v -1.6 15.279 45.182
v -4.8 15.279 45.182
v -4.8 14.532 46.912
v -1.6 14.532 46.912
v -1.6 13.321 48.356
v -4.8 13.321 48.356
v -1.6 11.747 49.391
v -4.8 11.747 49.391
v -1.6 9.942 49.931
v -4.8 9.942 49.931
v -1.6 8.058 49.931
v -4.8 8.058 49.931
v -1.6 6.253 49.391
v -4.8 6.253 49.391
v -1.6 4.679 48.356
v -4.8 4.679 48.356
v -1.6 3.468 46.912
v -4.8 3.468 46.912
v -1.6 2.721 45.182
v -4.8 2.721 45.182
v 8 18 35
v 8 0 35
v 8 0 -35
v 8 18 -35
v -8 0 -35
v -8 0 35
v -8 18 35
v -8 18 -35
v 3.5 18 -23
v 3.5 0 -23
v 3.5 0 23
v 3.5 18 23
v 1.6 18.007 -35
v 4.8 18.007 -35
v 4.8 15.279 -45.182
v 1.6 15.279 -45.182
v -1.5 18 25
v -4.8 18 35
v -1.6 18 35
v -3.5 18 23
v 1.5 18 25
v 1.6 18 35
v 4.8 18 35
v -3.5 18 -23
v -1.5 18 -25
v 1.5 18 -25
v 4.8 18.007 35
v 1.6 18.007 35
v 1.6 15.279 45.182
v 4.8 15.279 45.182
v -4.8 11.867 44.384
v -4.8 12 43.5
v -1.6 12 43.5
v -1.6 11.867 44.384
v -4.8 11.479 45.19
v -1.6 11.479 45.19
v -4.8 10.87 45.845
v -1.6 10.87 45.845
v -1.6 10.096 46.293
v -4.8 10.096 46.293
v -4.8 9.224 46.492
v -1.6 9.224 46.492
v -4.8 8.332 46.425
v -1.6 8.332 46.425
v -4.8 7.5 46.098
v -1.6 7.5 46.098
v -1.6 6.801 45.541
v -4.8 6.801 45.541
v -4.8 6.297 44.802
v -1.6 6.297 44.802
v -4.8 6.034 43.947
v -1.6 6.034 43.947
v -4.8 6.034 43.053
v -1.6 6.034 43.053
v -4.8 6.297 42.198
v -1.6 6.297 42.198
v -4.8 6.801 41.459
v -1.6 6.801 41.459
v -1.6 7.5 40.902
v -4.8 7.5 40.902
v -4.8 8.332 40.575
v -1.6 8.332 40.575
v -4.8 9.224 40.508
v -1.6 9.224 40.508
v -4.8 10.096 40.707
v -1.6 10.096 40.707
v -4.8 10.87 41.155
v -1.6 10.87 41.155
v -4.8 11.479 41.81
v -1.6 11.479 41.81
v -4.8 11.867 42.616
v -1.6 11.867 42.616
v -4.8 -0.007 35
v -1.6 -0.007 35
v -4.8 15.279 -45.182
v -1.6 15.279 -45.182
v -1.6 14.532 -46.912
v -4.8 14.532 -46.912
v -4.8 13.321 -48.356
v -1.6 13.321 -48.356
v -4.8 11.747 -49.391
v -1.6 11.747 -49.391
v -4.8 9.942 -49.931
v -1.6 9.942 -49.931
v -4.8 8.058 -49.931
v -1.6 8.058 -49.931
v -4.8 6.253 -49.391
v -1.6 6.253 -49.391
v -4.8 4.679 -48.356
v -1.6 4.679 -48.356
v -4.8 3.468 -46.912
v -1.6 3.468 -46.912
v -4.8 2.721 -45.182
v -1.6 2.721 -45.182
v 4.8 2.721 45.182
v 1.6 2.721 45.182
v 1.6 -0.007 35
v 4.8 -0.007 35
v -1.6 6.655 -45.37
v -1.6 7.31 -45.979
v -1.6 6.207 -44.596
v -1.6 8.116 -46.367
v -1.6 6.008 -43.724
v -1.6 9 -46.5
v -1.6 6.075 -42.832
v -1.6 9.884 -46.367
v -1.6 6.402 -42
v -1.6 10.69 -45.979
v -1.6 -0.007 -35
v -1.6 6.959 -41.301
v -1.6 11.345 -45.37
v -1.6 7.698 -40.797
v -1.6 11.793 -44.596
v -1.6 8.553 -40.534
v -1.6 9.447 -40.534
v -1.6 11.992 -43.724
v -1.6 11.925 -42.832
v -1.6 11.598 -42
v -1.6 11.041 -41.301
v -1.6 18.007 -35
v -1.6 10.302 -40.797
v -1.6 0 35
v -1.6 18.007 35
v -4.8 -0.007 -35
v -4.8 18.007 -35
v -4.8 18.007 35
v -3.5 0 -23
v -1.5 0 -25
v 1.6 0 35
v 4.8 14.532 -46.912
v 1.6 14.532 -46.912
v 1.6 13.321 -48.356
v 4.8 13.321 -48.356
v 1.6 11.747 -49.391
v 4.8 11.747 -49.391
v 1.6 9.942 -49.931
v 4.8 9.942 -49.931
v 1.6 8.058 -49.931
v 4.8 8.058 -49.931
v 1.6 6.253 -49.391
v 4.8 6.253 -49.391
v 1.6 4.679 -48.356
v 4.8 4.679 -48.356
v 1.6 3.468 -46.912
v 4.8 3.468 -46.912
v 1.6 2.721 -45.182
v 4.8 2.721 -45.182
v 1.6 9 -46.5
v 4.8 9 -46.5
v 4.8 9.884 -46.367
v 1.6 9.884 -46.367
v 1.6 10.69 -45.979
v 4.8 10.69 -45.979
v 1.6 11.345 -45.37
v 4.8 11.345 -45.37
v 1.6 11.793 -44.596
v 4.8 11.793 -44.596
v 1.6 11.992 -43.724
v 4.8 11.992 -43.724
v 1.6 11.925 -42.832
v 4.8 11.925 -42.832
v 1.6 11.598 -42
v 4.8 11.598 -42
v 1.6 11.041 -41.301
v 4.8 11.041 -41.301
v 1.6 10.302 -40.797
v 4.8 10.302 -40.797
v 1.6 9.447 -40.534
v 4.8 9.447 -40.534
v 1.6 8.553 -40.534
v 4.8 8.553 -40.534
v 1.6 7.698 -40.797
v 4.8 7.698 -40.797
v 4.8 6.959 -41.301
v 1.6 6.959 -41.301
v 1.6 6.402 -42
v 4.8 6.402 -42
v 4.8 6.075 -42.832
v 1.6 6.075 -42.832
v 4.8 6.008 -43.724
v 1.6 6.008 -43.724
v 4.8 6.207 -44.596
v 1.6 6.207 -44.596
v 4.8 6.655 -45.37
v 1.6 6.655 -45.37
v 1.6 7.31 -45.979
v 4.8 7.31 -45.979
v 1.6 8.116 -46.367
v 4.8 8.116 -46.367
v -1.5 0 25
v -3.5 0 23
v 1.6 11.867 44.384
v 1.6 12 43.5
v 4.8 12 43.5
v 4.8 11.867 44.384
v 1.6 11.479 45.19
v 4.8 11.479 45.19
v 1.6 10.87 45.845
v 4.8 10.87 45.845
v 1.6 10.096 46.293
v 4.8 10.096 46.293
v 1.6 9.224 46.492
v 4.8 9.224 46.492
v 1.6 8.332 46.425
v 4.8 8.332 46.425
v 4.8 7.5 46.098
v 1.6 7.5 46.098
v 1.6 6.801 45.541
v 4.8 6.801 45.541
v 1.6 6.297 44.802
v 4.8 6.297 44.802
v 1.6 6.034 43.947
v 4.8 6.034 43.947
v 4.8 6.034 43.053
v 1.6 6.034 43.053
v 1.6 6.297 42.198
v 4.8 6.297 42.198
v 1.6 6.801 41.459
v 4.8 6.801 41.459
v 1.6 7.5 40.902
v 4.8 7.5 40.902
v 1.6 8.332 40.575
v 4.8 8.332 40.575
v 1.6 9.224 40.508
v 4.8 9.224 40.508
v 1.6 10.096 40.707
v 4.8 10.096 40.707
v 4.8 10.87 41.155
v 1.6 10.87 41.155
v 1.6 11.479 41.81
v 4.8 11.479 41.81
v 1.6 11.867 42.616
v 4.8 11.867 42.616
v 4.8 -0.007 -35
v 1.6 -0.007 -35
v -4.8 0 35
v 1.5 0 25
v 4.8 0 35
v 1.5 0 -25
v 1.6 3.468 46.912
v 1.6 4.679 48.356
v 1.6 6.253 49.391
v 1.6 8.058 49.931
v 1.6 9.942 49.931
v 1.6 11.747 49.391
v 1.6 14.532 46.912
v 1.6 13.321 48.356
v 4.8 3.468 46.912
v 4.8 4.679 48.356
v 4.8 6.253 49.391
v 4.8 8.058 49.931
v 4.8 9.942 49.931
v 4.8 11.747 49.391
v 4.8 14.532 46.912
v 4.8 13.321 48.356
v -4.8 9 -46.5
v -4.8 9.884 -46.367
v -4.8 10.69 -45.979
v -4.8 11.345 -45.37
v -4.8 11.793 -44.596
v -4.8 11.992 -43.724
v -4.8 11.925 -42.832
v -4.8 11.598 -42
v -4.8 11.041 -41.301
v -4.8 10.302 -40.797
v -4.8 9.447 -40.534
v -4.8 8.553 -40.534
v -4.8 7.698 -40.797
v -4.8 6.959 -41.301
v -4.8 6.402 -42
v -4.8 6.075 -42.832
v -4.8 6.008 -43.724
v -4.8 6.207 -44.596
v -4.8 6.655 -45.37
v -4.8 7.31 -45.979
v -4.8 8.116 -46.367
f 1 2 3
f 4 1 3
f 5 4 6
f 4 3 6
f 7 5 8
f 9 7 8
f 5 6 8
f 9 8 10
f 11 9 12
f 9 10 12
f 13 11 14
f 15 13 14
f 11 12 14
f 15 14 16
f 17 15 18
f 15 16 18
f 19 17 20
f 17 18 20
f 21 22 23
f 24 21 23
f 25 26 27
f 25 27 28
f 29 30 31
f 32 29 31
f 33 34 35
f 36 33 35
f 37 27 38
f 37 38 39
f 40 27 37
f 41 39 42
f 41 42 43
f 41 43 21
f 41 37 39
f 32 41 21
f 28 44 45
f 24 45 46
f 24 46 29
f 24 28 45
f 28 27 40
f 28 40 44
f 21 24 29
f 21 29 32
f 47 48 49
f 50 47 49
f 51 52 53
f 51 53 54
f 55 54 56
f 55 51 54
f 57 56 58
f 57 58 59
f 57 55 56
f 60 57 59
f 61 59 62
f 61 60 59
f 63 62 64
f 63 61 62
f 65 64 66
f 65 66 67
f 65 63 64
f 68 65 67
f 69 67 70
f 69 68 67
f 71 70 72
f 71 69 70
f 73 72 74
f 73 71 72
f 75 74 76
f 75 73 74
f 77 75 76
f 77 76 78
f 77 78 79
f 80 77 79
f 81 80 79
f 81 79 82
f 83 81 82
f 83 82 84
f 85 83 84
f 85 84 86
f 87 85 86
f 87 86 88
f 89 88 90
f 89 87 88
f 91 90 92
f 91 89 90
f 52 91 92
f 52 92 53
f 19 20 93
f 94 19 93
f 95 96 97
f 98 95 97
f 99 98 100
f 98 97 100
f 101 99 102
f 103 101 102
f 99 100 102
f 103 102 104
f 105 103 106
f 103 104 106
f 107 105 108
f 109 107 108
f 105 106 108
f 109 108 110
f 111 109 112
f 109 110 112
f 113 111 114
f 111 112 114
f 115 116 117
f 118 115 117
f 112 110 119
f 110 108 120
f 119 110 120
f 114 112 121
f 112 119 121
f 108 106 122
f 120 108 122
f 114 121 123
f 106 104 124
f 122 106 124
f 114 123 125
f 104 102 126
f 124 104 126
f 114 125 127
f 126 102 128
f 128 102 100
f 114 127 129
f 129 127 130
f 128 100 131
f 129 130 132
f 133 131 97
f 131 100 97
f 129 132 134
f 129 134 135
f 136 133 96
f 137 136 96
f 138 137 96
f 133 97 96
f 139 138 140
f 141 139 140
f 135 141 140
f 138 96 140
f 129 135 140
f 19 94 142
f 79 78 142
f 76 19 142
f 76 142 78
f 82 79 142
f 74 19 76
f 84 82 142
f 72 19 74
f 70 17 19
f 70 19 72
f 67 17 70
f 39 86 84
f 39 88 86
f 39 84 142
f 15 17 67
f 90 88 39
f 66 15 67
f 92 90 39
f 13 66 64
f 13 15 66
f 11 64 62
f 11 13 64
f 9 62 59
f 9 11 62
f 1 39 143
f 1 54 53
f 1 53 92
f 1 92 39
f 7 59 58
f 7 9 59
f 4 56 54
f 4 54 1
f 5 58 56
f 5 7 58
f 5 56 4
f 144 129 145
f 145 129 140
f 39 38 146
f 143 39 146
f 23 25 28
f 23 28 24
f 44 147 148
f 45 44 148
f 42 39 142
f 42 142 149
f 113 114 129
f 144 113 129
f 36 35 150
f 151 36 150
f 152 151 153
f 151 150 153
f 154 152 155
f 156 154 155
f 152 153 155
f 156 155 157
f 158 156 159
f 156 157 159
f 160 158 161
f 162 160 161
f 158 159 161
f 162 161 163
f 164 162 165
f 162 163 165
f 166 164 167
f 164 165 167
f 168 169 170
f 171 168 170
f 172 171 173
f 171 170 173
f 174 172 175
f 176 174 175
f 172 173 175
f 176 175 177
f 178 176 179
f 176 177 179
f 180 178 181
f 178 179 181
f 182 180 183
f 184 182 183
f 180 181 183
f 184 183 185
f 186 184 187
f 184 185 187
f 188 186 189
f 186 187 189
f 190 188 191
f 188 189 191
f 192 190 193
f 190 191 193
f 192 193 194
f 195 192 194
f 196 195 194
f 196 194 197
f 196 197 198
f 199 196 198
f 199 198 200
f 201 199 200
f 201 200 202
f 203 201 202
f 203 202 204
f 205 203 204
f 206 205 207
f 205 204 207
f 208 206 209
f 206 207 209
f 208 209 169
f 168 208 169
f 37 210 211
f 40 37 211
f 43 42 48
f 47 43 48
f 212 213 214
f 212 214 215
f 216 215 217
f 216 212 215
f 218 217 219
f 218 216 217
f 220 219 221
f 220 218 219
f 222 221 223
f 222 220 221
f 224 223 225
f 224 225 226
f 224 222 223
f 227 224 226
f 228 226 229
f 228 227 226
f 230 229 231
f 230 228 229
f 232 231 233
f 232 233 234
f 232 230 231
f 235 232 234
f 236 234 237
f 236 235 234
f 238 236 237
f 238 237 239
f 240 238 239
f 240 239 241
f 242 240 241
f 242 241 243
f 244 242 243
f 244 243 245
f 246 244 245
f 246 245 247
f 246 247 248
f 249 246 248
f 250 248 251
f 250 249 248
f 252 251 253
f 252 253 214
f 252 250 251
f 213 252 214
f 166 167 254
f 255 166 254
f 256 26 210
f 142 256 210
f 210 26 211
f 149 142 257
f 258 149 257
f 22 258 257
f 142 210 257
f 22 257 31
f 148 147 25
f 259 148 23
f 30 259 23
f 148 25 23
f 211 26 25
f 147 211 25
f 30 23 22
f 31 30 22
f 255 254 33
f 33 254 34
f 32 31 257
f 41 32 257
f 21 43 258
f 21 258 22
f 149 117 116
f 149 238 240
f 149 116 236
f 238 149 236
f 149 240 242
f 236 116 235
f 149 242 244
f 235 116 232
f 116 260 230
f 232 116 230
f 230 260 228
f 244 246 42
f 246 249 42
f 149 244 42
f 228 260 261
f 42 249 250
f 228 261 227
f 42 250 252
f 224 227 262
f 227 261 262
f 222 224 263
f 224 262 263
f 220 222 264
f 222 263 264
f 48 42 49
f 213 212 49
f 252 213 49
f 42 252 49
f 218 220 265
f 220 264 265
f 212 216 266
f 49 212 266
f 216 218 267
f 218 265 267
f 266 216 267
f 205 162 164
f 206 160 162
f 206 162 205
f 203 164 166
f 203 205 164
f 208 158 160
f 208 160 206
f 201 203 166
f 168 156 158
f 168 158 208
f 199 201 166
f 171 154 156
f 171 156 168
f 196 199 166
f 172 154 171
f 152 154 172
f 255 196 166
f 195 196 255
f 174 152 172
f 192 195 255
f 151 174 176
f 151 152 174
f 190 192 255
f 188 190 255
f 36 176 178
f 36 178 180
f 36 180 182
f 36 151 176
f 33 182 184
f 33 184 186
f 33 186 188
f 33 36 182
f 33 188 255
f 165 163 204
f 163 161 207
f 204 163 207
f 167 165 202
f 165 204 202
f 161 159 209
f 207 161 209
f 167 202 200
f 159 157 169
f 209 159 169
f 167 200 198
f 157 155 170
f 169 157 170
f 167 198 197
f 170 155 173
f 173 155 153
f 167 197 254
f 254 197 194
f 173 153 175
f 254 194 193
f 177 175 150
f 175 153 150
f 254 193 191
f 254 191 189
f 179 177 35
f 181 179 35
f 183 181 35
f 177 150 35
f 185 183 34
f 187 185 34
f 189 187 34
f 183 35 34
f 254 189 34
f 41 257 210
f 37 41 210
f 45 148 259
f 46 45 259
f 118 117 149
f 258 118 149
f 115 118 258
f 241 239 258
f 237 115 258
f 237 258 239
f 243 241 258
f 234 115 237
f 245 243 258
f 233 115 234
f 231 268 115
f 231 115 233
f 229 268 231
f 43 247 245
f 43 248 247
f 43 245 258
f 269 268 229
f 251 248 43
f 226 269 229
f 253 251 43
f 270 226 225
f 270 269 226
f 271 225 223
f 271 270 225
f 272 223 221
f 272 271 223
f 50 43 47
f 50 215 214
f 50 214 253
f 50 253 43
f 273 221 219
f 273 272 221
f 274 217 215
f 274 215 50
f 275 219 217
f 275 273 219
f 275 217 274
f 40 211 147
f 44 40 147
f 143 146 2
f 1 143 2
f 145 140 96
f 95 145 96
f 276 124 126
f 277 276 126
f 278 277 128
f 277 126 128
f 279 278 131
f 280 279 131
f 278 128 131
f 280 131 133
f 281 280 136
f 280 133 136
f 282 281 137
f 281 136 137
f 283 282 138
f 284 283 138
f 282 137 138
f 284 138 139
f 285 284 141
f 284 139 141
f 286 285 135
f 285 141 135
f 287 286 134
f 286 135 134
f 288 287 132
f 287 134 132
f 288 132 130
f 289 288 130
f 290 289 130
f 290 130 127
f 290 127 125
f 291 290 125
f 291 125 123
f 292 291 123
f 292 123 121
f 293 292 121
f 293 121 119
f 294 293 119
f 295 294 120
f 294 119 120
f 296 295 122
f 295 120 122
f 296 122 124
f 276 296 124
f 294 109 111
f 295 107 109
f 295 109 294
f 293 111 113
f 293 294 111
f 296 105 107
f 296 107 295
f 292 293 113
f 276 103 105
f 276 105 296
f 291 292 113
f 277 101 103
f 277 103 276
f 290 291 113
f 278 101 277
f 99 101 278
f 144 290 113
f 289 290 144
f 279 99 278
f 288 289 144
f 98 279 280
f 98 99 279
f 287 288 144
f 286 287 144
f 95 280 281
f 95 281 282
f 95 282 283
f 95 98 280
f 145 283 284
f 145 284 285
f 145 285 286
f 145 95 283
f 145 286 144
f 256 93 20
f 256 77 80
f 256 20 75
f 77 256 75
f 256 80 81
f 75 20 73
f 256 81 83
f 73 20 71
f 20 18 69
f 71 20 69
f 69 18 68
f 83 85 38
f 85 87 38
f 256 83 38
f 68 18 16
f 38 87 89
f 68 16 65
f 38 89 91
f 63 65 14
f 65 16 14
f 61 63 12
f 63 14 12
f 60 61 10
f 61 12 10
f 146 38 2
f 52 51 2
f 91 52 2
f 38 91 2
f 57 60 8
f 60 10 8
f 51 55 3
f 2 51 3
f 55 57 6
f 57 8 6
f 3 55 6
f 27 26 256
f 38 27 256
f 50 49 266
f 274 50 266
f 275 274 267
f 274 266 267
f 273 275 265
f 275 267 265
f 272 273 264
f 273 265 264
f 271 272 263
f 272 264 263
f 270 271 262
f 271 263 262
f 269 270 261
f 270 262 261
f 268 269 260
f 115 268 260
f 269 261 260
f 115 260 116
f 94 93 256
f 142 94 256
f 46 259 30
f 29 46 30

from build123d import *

# Parameters (mm, degrees)
SKETCH1_W           = 16
SKETCH1_H           = 70
BOSS_EXTRUDE1_DEPTH = 18
SKETCH2_R           = 3
BOSS_EXTRUDE2_DEPTH = 3.2
MIRROR3_START       = -4.8
MIRROR3_OUTLINE_R   = 3
MIRROR3_DEPTH       = 3.2
MIRROR3_START_2     = 1.6
MIRROR3_2_OUTLINE_R = 3
MIRROR3_2_DEPTH     = 3.2


# Read off the part's stored shape, not the designer's step: Mirror3
with BuildPart() as part:
    # Sketch1 → Boss-Extrude1 (new body)
    with BuildSketch(Plane(origin=(0, 0, 0), x_dir=(1, 0, 0), z_dir=(0, 1, 0))):
        Rectangle(SKETCH1_W, SKETCH1_H)
        Polygon((-3.5, 23), (-1.5, 25), (1.5, 25), (3.5, 23), (3.5, -23), (1.5, -25), (-1.5, -25), (-3.5, -23), align=None, mode=Mode.SUBTRACT)
    extrude(amount=BOSS_EXTRUDE1_DEPTH)

    # Mirror3 outline → Mirror3 (add)
    with BuildSketch(Plane.YZ.offset(MIRROR3_START)):
        with BuildLine():
            Line((-0.006863308, 35), (18.006863308, 35))
            Line((18.006863308, 35), (15.278517871, 45.182323793))
            ThreePointArc((15.278517871, 45.182323793), (9, 50), (2.721482129, 45.182323793))
            Line((2.721482129, 45.182323793), (-0.006863308, 35))
        make_face()
        with Locations((9, 43.5)):
            Circle(MIRROR3_OUTLINE_R, mode=Mode.SUBTRACT)
    extrude(amount=MIRROR3_DEPTH)

    # Mirror3 2 outline → Mirror3 2 (add)
    with BuildSketch(Plane.YZ.offset(MIRROR3_START_2)):
        with BuildLine():
            Line((-0.006863308, 35), (18.006863308, 35))
            Line((18.006863308, 35), (15.278517871, 45.182323793))
            ThreePointArc((15.278517871, 45.182323793), (9, 50), (2.721482129, 45.182323793))
            Line((2.721482129, 45.182323793), (-0.006863308, 35))
        make_face()
        with Locations((9, 43.5)):
            Circle(MIRROR3_2_OUTLINE_R, mode=Mode.SUBTRACT)
    extrude(amount=MIRROR3_2_DEPTH)


with BuildPart() as body_2:
    # Sketch2 → Boss-Extrude2 (new body)
    with BuildSketch(Plane(origin=(4.8, 0, 0), x_dir=(0, 0, -1), z_dir=(1, 0, 0))):
        with BuildLine():
            Line((45.182323793, 2.721482129), (35, -0.006863308))
            Line((35, -0.006863308), (35, 18.006863308))
            Line((35, 18.006863308), (45.182323793, 15.278517871))
            ThreePointArc((45.182323793, 15.278517871), (50, 9), (45.182323793, 2.721482129))
        make_face()
        with Locations((43.5, 9)):
            Circle(SKETCH2_R, mode=Mode.SUBTRACT)
    extrude(amount=-BOSS_EXTRUDE2_DEPTH)


with BuildPart() as body_3:
    # Body-Move/Copy1: copy of body 2
    add(body_2.part.moved(Location((-6.4, 0, 0))))


solid = Compound([part.part, body_2.part, body_3.part])
